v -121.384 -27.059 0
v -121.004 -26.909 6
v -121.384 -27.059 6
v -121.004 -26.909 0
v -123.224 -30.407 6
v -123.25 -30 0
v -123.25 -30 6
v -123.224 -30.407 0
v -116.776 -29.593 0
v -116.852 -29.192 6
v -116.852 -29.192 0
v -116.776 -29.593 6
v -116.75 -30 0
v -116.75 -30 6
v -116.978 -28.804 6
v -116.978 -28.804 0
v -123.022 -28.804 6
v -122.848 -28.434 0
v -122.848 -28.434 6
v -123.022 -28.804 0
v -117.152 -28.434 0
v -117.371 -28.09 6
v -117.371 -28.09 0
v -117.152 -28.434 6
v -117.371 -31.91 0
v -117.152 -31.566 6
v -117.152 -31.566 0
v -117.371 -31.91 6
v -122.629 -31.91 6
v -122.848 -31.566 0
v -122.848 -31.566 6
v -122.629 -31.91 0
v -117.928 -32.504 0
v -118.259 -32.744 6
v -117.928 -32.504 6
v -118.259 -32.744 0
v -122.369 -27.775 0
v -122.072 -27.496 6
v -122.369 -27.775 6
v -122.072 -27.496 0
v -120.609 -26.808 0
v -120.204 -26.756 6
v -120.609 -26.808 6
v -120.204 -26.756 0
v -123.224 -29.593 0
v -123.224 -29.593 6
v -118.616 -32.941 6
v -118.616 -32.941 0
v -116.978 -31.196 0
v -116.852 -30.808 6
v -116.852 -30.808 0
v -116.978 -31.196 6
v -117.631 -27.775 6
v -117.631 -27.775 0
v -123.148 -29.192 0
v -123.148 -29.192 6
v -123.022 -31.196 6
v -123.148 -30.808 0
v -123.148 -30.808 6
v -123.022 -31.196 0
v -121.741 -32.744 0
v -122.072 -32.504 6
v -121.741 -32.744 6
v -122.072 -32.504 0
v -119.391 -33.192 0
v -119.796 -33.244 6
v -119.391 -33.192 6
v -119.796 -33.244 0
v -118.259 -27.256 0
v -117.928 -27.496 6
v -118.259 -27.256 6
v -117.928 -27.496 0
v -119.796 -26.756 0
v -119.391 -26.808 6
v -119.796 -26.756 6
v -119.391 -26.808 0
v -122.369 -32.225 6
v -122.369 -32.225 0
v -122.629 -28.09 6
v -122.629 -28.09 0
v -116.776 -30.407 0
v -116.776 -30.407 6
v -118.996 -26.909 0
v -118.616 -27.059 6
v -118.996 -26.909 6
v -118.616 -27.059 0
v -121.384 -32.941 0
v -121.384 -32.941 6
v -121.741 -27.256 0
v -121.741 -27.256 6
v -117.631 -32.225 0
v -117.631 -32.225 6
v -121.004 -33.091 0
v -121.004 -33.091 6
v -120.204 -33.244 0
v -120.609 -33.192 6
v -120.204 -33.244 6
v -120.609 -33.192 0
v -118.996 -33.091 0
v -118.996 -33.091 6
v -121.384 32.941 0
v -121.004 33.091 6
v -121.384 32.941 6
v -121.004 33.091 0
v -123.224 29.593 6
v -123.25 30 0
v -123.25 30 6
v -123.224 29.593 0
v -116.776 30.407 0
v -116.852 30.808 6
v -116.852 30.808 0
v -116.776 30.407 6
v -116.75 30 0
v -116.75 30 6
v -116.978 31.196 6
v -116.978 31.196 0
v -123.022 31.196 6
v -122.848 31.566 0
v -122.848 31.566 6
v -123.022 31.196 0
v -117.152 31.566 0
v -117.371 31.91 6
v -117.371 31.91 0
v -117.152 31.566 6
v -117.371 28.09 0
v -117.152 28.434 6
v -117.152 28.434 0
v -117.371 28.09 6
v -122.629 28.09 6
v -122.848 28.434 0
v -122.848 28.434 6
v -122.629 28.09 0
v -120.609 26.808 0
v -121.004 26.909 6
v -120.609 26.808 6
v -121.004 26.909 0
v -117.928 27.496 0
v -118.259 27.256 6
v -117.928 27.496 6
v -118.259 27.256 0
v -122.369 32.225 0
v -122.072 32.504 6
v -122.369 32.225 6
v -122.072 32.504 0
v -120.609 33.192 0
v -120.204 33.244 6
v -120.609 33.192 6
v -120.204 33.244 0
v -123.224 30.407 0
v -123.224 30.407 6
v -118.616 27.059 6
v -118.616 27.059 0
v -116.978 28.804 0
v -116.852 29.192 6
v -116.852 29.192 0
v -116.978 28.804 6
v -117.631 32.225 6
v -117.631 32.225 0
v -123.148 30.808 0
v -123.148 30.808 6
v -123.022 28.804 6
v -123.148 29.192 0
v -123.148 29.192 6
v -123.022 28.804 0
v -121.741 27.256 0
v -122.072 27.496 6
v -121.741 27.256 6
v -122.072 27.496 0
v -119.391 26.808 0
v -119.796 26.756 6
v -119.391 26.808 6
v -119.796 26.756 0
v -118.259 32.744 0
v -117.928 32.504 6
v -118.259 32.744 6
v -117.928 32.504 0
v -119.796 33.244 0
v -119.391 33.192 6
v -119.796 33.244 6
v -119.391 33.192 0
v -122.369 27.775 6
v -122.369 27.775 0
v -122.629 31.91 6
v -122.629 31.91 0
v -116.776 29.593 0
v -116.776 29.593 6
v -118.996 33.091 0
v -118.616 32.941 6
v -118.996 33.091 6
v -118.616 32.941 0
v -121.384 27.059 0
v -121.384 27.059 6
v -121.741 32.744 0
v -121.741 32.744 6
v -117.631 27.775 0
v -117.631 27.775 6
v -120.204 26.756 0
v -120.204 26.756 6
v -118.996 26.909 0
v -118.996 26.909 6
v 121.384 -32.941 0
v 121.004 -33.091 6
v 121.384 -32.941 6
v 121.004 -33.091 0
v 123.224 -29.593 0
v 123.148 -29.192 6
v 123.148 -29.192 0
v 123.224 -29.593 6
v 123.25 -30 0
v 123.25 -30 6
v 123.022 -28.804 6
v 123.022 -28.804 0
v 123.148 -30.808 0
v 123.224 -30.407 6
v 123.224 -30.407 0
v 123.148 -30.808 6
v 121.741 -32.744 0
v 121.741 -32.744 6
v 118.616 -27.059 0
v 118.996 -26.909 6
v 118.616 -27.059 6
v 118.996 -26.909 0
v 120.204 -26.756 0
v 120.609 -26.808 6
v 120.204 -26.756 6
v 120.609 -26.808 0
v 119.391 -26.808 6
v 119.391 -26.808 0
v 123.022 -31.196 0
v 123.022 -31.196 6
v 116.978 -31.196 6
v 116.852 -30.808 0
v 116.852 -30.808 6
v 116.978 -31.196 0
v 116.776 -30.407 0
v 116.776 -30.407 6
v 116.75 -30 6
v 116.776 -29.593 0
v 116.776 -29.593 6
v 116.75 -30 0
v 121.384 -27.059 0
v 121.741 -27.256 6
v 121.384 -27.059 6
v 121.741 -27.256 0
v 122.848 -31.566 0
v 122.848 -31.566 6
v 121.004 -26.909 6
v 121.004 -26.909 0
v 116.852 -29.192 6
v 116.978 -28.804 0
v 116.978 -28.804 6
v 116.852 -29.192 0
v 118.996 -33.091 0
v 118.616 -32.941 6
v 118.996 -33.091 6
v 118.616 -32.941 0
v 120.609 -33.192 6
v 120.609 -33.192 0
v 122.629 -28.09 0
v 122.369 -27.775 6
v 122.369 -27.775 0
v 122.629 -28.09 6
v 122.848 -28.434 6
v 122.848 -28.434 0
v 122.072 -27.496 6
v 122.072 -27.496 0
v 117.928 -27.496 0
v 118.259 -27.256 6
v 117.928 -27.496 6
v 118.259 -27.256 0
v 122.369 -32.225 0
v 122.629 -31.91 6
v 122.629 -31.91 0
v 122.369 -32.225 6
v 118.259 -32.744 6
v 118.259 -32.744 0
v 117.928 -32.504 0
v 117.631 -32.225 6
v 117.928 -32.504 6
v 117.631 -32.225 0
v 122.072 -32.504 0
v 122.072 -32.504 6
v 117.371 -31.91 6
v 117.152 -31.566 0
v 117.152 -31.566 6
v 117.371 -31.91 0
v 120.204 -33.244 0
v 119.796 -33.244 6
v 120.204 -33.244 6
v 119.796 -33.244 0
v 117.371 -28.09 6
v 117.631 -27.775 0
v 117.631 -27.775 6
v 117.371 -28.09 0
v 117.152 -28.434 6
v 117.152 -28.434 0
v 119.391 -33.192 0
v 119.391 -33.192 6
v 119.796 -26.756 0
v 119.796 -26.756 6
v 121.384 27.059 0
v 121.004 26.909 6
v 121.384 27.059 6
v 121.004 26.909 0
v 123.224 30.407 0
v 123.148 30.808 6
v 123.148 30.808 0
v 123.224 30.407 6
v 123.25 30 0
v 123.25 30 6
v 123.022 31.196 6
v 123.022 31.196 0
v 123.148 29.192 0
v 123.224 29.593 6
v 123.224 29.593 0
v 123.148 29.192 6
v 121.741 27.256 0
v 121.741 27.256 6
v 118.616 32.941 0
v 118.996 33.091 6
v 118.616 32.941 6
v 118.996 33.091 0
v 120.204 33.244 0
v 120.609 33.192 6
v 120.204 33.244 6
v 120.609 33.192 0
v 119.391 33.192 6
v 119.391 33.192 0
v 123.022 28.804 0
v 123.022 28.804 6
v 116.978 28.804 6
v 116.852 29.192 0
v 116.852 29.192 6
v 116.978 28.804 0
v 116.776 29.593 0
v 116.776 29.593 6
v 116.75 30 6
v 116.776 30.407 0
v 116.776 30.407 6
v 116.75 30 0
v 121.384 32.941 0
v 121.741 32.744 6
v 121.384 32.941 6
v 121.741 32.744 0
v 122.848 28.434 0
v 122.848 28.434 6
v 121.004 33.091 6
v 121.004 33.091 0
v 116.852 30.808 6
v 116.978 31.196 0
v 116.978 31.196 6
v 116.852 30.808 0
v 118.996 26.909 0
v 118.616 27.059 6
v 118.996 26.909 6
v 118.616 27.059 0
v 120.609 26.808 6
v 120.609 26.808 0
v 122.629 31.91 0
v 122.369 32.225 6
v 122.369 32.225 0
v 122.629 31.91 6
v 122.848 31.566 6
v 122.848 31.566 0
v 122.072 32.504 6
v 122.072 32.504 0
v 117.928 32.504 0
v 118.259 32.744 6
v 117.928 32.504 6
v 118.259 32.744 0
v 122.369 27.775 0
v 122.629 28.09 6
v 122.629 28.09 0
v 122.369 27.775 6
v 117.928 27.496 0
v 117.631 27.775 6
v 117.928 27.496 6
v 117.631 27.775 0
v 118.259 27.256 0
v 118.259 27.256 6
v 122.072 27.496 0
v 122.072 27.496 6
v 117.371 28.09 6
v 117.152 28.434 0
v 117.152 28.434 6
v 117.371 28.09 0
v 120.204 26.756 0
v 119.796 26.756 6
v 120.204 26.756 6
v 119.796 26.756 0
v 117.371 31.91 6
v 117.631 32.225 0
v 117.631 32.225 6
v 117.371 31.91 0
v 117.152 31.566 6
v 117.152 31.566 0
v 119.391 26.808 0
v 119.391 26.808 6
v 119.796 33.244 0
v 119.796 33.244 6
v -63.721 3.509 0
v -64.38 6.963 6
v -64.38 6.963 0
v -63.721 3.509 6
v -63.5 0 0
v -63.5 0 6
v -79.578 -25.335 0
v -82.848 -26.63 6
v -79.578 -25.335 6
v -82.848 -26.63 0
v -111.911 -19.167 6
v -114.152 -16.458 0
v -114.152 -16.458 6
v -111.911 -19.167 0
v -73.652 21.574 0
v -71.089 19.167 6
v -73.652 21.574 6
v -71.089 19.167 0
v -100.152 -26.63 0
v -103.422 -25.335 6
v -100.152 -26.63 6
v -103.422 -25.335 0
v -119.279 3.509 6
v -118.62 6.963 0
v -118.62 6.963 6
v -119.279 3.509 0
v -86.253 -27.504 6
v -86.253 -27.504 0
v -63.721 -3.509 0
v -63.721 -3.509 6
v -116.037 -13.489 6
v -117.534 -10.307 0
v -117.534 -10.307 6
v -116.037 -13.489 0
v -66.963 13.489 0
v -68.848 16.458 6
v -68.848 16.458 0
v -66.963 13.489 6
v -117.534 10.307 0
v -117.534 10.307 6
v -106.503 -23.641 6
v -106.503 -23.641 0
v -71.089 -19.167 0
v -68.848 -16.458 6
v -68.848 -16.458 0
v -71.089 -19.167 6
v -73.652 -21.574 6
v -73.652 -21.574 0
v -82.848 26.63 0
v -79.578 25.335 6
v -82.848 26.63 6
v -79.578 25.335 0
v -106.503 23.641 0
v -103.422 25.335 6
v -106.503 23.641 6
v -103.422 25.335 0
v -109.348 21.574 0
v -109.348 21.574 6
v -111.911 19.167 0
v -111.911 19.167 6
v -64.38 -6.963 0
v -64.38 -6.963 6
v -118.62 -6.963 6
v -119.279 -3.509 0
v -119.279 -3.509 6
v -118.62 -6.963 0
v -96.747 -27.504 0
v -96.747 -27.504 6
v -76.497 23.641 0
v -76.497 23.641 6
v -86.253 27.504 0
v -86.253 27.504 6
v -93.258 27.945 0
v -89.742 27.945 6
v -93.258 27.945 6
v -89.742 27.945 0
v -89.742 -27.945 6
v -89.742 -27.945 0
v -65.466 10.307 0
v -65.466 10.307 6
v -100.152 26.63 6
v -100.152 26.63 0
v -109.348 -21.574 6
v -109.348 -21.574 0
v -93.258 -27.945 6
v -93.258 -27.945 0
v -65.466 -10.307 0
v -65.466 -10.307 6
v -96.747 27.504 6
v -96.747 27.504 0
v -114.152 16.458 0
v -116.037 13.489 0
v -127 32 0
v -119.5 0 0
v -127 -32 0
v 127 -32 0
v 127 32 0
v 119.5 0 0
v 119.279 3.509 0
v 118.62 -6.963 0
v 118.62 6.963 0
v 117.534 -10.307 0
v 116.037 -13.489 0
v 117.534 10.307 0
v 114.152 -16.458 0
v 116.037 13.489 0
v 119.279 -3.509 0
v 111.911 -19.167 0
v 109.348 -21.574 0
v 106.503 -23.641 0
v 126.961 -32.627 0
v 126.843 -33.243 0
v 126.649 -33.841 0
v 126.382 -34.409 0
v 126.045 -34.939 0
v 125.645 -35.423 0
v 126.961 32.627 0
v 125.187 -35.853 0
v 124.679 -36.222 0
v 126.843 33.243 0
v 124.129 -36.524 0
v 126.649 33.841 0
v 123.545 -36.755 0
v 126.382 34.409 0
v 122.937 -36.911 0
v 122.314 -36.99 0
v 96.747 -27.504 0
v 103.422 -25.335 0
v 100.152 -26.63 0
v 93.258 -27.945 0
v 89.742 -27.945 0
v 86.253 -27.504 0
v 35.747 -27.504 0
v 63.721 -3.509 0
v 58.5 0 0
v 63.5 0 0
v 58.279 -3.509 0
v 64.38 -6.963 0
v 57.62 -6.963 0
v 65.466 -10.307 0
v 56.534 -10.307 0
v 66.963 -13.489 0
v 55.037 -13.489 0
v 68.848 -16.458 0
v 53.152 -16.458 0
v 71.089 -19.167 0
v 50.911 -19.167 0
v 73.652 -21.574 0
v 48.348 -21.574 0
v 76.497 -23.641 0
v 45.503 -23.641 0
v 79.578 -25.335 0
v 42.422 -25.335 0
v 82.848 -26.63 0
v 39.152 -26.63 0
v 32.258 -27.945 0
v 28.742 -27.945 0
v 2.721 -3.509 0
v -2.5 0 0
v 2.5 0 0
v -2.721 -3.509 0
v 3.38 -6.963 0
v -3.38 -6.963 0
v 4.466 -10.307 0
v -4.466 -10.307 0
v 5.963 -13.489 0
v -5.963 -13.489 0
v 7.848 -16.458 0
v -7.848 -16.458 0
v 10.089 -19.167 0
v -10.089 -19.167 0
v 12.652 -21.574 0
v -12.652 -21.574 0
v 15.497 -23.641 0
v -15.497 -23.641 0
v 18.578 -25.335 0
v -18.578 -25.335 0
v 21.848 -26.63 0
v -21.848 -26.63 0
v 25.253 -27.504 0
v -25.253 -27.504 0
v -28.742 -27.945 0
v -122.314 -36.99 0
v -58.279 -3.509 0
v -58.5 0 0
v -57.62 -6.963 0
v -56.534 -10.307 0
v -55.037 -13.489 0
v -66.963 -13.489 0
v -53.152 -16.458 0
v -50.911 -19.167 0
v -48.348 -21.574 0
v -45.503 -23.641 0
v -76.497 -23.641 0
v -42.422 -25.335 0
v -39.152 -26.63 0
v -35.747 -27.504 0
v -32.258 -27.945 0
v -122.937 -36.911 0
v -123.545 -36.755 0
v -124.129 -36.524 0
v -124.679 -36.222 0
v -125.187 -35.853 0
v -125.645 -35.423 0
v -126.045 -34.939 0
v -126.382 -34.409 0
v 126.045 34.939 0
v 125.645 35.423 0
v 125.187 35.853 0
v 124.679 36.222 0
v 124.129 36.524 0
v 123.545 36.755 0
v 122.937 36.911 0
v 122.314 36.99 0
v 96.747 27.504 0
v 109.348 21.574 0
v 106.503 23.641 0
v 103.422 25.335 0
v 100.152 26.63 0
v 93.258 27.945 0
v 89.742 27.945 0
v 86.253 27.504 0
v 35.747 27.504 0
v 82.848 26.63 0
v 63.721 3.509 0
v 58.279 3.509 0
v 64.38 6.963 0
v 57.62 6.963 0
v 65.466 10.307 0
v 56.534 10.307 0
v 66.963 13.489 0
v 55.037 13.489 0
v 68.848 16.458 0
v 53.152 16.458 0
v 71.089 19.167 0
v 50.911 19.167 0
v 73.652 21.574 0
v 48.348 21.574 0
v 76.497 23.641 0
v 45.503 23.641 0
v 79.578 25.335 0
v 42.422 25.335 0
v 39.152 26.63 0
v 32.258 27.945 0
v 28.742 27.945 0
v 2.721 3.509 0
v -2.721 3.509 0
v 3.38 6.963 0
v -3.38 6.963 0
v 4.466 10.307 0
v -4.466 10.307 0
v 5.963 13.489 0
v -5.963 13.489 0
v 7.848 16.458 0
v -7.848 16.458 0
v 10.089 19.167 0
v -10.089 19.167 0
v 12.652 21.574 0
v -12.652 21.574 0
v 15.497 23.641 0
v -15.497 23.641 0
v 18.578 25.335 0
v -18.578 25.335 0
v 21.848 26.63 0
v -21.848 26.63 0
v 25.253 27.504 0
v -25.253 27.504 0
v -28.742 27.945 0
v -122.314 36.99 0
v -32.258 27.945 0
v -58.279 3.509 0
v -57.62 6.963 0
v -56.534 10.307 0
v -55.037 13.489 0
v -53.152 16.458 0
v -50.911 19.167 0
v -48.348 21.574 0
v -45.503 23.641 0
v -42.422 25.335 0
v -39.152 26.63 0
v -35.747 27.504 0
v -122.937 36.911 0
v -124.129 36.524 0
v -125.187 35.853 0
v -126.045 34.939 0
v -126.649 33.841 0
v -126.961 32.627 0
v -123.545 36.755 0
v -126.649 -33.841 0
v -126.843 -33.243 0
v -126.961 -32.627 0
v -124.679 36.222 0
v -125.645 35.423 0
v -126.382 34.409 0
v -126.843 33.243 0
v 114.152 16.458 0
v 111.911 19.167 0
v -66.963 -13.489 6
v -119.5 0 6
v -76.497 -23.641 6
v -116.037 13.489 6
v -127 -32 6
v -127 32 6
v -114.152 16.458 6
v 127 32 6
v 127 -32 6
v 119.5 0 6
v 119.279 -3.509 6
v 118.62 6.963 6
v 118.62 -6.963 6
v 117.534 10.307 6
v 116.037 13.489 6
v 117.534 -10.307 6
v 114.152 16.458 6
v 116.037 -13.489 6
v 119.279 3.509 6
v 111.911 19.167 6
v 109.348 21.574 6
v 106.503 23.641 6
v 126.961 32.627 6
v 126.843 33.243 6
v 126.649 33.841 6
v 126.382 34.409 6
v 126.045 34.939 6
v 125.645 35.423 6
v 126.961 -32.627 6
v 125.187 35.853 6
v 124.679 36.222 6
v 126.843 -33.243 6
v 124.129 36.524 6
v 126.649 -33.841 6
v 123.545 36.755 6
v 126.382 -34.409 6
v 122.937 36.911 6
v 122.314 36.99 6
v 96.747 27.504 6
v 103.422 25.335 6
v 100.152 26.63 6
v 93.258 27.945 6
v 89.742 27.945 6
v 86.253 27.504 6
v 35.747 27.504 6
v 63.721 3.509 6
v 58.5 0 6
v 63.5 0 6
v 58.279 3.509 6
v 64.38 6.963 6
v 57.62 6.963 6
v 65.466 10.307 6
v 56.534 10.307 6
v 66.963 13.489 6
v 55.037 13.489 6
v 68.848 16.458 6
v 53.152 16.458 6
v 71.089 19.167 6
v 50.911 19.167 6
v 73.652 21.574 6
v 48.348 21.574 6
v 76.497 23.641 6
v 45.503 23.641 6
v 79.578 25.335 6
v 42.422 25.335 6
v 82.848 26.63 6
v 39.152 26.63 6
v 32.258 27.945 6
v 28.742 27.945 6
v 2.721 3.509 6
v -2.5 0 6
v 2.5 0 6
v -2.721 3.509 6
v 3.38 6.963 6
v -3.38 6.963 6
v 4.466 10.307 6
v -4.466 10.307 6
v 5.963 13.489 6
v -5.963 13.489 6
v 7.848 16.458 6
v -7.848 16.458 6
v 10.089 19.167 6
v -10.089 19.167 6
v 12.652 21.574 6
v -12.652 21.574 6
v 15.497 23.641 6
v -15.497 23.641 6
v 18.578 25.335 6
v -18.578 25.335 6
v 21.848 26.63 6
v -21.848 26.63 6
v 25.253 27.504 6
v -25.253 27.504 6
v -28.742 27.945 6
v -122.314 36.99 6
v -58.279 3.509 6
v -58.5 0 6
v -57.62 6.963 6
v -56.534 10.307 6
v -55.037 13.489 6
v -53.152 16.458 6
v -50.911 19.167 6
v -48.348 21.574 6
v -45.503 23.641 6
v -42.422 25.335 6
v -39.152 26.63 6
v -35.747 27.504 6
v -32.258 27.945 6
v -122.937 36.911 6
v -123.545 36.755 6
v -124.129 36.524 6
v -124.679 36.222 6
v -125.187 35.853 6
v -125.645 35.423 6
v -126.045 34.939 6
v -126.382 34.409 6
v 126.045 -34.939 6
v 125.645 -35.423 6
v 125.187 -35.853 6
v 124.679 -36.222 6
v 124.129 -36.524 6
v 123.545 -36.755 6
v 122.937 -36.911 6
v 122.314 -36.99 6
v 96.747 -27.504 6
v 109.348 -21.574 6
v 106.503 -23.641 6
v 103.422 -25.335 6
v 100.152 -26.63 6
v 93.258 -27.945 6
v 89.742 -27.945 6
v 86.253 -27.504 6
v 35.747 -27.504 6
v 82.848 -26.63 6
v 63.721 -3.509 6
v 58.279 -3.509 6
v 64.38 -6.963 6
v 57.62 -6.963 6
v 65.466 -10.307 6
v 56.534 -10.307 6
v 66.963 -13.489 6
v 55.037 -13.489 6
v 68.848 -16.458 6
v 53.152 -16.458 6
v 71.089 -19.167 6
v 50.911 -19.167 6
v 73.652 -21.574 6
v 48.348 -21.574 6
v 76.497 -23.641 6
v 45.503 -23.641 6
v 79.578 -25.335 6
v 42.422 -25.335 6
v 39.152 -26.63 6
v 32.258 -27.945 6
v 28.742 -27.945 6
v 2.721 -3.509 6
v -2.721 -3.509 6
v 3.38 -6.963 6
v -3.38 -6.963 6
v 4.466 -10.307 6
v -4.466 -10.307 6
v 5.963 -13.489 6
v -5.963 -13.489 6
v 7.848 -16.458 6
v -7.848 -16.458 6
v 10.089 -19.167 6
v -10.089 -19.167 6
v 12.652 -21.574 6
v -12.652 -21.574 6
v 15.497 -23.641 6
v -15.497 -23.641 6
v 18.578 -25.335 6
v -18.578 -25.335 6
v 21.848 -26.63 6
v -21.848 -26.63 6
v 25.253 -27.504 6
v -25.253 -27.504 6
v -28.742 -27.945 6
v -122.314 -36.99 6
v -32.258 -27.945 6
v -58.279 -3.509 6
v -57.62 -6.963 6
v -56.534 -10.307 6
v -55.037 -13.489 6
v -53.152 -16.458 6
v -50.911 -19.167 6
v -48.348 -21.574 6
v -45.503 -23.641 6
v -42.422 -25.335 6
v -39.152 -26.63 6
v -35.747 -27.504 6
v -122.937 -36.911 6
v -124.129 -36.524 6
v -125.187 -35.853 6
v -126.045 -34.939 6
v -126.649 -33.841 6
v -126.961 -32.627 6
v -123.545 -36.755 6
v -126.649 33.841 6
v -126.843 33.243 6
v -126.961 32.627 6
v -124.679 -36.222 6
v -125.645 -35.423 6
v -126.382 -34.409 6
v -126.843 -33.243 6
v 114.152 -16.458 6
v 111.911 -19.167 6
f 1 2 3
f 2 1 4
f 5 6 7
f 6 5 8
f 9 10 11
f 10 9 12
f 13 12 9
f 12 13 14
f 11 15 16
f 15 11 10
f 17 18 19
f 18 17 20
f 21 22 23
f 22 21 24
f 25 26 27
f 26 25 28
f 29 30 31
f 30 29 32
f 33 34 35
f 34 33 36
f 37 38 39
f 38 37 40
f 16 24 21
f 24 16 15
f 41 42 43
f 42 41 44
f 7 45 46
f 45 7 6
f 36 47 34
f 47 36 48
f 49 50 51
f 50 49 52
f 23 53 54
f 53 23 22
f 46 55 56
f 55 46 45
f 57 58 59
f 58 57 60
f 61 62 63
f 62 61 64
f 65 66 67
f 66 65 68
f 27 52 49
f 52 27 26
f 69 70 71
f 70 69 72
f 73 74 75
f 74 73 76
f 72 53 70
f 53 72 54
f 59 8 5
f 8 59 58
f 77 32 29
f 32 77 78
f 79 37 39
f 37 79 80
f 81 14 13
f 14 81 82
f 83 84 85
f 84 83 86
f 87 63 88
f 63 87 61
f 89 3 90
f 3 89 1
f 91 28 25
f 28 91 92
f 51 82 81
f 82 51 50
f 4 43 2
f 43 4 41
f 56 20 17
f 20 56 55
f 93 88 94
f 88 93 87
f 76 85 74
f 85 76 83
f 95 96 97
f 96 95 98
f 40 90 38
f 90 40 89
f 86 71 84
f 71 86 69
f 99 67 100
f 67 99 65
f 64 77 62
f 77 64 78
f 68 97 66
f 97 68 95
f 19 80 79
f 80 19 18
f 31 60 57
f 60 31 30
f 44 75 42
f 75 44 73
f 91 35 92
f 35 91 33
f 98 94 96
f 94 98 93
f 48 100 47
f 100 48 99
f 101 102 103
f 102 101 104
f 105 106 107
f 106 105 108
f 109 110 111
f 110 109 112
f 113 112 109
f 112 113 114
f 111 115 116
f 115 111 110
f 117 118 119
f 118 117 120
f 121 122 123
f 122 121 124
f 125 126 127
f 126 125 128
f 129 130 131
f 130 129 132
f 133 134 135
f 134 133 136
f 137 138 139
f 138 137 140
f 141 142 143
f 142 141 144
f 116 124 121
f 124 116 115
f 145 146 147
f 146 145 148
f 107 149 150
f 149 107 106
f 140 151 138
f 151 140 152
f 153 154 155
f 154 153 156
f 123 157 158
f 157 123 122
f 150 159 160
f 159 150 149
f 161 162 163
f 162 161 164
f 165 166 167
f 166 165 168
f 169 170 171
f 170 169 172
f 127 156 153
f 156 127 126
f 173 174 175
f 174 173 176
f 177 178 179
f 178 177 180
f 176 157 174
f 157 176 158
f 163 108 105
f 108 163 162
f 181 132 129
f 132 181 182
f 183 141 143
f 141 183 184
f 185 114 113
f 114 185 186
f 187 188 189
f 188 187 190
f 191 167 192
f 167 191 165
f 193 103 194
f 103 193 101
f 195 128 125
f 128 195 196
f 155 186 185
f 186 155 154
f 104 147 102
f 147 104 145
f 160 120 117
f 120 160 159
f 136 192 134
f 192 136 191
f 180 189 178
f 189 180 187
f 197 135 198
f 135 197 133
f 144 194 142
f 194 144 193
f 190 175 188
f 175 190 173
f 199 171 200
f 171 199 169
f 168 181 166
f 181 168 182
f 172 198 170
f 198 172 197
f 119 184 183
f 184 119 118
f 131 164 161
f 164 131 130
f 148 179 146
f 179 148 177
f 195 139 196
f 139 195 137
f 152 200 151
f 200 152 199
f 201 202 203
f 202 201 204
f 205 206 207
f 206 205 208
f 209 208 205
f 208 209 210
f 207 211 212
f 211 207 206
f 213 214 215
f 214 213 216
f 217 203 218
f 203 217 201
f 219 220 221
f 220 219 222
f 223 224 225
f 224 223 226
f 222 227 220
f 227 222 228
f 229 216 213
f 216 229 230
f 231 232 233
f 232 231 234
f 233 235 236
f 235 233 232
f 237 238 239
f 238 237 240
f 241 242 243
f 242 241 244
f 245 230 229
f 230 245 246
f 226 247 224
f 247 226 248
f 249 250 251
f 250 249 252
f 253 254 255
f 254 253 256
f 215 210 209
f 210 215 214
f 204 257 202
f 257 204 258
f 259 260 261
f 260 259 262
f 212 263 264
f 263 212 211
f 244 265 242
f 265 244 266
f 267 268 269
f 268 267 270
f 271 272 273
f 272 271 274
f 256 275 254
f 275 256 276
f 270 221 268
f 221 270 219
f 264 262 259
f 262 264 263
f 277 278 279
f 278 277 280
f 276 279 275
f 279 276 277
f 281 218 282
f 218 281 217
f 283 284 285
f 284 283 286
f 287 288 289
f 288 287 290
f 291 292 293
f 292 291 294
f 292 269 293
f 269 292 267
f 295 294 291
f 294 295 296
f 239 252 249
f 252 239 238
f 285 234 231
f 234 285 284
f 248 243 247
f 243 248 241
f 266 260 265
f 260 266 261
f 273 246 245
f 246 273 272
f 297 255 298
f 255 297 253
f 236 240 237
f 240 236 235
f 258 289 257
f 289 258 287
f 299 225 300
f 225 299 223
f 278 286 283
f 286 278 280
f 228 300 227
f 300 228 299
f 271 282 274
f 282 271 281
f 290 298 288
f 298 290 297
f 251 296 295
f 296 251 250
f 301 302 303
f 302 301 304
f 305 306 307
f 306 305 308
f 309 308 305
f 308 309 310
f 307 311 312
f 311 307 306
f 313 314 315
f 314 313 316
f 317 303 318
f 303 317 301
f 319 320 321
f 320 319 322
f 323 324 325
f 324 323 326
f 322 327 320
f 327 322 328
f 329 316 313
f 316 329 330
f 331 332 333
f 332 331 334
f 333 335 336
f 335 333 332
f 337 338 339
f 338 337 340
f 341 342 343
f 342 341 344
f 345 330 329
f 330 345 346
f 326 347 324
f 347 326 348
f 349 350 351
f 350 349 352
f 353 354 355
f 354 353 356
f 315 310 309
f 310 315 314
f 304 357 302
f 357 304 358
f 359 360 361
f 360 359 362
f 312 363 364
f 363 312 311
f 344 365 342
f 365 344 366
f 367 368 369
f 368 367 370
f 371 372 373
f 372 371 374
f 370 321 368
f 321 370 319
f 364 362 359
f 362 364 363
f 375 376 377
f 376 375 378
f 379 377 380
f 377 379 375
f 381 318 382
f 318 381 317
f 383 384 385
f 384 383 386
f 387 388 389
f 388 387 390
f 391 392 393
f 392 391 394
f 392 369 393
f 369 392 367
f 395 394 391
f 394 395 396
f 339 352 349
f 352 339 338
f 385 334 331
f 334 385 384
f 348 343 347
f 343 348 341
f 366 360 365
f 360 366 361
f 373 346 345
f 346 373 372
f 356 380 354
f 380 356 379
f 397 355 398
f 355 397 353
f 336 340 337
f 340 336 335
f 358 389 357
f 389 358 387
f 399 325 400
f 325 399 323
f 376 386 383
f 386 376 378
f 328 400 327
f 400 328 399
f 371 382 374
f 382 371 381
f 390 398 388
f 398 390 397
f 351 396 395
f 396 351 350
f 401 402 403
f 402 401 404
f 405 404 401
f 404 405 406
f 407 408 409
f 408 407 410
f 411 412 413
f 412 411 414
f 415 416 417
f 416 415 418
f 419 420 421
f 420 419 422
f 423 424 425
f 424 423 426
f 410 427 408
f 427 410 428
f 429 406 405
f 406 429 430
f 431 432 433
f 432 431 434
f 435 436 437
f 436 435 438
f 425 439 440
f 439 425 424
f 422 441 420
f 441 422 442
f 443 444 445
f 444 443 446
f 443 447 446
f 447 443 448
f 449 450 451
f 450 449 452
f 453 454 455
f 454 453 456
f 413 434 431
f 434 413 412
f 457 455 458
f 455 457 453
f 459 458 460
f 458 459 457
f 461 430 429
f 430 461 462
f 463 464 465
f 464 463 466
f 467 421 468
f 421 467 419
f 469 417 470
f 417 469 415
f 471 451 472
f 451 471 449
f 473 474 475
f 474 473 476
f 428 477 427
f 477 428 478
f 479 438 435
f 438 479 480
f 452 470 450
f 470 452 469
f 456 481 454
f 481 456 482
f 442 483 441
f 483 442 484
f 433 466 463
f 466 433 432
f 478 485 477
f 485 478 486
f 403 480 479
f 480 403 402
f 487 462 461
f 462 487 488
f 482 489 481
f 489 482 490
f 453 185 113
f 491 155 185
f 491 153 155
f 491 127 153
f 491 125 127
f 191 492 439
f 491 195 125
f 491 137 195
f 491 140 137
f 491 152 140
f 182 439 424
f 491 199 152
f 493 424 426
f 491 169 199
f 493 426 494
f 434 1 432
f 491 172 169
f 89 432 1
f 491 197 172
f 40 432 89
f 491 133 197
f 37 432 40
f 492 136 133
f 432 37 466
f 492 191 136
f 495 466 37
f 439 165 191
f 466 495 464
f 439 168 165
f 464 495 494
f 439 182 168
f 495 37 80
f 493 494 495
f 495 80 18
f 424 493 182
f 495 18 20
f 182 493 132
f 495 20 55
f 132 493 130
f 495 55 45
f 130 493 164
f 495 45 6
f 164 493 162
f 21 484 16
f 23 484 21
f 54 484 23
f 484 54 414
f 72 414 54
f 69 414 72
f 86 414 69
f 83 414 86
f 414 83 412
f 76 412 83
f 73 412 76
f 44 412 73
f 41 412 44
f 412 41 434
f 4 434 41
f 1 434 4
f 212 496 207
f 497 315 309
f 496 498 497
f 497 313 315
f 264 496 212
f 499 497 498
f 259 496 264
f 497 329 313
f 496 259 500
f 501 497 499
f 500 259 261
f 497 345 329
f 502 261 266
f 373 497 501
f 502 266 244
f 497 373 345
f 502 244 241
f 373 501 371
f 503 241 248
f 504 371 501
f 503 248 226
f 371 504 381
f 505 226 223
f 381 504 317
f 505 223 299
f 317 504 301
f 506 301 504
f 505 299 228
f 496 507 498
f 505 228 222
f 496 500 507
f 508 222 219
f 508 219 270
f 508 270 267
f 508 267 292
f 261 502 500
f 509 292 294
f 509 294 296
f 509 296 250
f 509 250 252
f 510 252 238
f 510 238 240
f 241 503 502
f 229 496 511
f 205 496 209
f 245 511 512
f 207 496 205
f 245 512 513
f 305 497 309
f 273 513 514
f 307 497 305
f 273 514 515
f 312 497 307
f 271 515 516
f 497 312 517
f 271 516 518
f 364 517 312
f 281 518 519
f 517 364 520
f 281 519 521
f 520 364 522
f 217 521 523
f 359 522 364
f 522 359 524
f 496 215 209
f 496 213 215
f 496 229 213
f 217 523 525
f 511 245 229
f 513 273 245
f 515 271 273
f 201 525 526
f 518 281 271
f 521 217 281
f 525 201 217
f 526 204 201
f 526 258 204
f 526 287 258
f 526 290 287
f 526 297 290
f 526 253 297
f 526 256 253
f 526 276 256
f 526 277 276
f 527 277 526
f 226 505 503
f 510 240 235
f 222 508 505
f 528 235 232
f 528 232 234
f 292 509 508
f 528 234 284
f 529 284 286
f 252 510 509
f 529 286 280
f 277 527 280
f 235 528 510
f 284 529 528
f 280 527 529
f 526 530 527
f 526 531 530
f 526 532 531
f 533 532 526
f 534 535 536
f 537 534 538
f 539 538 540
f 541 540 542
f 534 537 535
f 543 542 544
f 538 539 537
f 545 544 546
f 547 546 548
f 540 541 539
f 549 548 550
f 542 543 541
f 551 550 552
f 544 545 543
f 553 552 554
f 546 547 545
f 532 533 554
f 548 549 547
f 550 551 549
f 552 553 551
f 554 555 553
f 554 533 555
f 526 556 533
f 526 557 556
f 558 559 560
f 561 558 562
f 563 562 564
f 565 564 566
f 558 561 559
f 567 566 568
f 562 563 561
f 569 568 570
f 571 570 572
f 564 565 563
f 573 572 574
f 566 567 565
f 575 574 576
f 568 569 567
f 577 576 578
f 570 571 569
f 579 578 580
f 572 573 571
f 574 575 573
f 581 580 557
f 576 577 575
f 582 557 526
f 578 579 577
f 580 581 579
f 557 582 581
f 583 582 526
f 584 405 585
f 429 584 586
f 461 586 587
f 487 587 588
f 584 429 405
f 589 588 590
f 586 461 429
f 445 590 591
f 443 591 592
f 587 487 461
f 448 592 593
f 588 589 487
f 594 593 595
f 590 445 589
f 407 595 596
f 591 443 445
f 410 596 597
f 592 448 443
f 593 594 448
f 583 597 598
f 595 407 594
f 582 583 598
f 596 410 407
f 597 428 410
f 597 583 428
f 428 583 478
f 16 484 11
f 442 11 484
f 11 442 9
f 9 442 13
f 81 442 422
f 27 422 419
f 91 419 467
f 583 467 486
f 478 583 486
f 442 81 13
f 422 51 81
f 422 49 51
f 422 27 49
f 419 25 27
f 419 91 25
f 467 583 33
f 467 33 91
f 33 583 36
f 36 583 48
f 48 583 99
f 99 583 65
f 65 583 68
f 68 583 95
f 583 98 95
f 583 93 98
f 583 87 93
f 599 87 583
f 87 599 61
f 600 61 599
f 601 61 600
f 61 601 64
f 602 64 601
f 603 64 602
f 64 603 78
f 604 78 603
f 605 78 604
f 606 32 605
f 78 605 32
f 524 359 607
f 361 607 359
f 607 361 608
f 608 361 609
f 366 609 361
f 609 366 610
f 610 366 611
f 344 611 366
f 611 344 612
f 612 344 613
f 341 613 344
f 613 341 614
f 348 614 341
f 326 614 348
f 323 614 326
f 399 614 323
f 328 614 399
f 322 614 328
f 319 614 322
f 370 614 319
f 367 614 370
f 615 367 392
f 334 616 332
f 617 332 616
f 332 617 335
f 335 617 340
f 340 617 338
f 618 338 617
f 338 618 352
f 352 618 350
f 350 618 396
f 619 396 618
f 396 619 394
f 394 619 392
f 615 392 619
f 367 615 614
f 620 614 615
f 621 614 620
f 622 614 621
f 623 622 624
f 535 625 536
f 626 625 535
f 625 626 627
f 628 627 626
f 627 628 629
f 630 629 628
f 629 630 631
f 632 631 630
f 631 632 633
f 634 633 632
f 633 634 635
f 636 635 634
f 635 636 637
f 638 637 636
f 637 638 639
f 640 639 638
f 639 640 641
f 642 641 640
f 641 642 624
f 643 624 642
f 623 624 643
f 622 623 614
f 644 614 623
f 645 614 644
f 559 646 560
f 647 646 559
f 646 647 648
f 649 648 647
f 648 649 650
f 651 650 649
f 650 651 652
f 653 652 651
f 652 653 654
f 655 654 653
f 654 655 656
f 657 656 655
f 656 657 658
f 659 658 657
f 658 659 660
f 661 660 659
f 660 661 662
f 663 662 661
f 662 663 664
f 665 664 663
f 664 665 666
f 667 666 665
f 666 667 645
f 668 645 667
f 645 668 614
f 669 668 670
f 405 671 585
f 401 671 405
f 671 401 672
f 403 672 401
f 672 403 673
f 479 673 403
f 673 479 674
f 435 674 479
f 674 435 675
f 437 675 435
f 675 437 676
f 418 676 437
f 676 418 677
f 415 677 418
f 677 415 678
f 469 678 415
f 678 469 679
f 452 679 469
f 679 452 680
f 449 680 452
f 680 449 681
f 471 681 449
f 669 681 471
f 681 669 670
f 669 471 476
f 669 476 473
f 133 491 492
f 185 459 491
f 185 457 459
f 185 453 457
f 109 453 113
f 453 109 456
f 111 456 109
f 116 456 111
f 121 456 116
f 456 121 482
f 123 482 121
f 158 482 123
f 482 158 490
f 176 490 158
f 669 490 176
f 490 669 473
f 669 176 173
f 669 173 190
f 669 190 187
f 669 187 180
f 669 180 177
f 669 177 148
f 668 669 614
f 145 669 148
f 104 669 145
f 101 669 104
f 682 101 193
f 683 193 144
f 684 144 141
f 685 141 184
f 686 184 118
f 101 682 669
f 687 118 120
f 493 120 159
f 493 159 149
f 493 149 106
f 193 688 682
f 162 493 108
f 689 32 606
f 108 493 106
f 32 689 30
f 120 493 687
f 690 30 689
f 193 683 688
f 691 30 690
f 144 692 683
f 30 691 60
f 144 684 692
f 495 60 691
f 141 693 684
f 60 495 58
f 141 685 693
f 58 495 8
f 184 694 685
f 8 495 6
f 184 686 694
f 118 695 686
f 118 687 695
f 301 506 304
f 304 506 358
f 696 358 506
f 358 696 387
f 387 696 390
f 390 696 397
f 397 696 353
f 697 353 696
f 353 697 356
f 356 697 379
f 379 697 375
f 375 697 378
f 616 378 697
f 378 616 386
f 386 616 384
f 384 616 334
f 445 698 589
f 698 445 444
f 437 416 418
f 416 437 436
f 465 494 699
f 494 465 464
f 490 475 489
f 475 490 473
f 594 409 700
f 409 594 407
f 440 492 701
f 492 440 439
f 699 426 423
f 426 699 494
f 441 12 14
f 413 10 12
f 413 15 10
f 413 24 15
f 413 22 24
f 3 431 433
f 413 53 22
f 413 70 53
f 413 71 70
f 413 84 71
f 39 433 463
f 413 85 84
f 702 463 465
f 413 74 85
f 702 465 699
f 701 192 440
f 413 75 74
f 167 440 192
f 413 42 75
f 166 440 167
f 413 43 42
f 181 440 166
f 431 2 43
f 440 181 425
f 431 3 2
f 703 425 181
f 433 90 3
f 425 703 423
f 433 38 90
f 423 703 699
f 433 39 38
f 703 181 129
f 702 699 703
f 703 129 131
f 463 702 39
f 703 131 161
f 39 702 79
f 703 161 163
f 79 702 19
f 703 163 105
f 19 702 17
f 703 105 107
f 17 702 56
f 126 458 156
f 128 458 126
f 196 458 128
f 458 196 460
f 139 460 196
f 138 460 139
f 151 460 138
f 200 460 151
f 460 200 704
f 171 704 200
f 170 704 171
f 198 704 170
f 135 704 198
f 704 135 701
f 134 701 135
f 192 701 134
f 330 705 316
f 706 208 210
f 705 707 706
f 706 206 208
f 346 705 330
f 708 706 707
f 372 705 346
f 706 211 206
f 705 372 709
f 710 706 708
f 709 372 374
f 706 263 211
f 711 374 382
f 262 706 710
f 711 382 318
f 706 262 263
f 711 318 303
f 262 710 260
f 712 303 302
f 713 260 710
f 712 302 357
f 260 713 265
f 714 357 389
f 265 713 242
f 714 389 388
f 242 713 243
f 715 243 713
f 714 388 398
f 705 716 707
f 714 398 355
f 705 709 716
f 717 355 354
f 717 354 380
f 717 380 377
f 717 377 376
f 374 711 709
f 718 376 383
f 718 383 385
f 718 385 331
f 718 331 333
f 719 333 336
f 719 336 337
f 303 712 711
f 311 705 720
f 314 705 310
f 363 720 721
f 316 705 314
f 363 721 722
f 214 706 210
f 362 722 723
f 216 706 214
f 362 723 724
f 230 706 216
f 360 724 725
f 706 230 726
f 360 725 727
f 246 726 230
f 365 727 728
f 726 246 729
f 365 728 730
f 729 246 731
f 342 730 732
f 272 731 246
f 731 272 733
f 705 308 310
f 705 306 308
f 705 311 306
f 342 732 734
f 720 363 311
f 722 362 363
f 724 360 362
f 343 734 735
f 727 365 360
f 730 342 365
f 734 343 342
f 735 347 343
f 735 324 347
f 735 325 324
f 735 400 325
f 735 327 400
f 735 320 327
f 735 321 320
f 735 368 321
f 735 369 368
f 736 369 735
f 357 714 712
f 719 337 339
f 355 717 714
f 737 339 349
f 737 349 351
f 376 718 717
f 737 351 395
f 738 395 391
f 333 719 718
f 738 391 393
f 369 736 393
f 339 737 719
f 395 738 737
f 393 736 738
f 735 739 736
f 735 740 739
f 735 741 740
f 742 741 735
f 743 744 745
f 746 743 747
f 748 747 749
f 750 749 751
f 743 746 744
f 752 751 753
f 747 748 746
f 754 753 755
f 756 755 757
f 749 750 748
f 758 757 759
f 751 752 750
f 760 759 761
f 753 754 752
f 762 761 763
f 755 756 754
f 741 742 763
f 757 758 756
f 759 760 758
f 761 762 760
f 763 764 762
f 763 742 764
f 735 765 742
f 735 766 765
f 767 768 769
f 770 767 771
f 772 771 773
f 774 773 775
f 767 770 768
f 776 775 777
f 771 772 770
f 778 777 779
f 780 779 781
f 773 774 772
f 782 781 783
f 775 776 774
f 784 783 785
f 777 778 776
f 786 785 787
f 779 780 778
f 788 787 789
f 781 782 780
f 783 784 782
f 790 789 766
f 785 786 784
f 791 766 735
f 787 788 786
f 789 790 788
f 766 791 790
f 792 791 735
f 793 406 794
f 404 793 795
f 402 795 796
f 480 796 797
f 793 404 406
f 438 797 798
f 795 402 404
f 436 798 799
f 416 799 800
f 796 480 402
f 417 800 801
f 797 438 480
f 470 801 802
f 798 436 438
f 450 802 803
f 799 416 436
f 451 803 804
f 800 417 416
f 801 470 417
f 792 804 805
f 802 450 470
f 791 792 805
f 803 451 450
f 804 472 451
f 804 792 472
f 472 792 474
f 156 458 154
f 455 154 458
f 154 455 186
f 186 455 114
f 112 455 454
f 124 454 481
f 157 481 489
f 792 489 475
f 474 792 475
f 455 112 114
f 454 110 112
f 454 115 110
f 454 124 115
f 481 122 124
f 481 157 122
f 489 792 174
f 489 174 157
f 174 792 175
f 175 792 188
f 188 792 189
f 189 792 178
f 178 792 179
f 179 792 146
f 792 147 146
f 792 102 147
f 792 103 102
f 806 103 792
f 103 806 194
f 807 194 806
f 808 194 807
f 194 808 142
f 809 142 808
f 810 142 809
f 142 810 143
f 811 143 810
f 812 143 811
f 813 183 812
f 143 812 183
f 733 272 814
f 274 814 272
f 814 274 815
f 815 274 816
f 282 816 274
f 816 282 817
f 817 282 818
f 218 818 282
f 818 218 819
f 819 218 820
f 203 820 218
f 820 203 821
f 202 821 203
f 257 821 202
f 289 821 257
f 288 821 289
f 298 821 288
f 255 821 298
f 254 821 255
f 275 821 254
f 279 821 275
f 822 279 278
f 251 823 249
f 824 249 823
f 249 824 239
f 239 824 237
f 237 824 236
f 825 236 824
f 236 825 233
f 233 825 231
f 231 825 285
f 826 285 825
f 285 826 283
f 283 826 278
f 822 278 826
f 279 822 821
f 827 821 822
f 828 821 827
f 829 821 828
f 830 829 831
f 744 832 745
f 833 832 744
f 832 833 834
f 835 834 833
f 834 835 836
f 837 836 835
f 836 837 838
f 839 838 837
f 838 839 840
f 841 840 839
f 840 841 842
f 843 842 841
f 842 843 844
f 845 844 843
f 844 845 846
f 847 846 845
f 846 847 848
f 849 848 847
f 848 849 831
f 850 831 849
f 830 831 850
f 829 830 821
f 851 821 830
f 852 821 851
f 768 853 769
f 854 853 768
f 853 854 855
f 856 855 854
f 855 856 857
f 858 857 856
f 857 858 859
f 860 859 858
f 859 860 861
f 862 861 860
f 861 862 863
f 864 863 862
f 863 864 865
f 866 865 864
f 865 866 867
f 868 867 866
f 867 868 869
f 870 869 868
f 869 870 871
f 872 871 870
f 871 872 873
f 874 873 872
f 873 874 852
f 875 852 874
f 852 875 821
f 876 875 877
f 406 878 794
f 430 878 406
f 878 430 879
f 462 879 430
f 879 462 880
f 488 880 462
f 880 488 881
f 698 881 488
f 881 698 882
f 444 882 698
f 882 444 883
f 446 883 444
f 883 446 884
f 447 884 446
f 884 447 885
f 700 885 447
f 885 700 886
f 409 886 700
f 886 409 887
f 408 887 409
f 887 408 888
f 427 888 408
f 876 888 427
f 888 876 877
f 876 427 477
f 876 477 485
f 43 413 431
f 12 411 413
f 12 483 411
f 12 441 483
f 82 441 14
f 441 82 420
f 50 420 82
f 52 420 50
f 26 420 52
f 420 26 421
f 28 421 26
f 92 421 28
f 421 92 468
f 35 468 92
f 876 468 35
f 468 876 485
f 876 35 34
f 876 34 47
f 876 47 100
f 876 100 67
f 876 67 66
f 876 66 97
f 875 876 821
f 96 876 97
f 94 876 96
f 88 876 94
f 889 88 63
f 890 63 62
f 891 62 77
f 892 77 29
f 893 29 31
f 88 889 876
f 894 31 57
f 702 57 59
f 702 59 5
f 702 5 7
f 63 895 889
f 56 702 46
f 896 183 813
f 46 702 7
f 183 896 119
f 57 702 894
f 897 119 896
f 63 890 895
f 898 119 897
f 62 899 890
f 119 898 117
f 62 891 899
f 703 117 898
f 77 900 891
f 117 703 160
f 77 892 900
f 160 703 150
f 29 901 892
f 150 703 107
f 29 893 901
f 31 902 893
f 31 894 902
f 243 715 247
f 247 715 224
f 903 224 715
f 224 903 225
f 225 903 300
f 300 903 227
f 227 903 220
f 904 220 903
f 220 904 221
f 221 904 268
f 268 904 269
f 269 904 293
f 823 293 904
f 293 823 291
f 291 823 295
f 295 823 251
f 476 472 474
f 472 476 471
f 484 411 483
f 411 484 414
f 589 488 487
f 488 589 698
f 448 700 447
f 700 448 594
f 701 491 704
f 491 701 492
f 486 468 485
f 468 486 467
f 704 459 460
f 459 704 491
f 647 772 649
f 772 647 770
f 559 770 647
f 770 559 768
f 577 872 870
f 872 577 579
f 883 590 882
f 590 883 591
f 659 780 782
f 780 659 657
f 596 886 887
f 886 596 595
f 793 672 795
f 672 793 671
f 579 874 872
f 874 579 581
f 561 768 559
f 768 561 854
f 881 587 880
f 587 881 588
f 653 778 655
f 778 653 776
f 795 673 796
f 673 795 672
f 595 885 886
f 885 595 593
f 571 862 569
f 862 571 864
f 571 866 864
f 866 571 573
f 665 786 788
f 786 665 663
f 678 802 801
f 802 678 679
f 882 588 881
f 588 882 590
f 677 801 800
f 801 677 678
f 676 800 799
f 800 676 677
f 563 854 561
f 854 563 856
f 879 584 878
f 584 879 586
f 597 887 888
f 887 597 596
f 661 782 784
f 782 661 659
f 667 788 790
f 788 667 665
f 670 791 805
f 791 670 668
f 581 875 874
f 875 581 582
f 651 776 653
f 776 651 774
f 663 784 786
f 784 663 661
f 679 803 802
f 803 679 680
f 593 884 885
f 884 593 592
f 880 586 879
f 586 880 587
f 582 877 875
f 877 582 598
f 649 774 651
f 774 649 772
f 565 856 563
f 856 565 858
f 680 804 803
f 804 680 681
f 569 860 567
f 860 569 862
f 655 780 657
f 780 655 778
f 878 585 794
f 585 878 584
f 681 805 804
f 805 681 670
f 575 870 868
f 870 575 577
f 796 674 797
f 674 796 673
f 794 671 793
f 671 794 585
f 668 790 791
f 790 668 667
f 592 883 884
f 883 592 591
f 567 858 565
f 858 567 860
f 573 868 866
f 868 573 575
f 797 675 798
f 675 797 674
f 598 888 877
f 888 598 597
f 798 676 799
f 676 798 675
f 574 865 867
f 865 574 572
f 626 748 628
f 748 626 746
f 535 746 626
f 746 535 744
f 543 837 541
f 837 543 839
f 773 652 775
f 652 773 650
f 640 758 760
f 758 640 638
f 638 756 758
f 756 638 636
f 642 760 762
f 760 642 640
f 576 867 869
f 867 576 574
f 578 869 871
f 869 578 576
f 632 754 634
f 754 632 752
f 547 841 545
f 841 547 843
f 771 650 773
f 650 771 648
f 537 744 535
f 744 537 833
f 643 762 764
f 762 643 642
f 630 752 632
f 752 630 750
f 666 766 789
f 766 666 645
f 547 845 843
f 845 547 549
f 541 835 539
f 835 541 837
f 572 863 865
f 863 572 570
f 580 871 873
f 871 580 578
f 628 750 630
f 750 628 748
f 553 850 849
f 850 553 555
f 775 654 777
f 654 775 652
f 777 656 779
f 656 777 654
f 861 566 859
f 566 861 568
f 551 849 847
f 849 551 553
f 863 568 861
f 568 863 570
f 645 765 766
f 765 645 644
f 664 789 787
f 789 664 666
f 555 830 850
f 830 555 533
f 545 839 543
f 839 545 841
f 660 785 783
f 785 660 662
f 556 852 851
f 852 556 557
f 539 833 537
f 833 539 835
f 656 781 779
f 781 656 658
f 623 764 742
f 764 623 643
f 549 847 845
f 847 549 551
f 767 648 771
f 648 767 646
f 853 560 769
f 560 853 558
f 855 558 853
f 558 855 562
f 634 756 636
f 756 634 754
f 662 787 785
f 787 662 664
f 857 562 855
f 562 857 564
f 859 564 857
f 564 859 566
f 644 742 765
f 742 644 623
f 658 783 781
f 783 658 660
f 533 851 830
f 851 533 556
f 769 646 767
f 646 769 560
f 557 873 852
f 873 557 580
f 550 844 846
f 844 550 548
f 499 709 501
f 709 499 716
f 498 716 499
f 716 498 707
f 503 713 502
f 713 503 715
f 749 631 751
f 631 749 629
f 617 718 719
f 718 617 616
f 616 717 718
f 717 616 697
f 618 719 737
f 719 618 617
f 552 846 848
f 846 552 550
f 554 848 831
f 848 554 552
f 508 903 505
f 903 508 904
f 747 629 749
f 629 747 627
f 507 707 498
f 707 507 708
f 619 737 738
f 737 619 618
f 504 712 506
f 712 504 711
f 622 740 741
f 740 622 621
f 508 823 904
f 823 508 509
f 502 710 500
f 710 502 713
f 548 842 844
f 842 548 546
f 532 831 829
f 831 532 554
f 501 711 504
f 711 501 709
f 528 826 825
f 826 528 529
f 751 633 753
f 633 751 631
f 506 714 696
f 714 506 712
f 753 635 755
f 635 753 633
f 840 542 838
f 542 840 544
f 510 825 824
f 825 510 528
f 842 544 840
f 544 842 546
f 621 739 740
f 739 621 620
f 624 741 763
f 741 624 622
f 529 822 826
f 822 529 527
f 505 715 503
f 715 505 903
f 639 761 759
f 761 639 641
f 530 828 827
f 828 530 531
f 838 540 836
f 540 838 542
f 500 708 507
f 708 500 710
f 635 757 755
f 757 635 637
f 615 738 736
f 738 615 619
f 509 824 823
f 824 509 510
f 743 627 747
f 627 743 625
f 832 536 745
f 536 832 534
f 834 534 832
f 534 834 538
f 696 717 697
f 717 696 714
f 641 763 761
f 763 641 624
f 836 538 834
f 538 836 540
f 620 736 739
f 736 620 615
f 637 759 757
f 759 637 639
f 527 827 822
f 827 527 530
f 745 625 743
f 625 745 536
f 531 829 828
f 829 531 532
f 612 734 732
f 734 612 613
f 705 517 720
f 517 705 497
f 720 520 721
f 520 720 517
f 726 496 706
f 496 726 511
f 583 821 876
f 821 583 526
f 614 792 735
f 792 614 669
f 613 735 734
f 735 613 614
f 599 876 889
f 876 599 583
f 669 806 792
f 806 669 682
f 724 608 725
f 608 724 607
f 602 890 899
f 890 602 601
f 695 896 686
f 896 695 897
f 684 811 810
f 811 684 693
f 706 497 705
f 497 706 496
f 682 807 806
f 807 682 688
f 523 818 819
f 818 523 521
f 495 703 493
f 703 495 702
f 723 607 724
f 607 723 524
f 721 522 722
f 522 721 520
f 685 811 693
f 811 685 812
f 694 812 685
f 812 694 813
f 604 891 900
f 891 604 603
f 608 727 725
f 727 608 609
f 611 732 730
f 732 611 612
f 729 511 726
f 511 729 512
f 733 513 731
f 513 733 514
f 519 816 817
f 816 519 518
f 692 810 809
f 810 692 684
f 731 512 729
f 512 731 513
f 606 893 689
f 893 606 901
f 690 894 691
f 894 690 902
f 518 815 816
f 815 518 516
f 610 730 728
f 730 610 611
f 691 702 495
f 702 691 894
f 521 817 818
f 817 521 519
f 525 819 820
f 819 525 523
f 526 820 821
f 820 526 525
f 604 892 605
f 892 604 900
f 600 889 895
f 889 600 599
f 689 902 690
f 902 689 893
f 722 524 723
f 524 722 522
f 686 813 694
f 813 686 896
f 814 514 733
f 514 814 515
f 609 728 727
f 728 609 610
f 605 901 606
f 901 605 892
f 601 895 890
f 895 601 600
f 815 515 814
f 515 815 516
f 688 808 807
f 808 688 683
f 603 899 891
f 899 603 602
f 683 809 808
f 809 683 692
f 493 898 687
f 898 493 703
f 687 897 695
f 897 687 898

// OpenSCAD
$fn = 50;


difference() {
	union() {
		hull() {
			translate(v = [-122.0000000000, 32.0000000000, 0]) {
				cylinder(h = 6, r = 5);
			}
			translate(v = [122.0000000000, 32.0000000000, 0]) {
				cylinder(h = 6, r = 5);
			}
			translate(v = [-122.0000000000, -32.0000000000, 0]) {
				cylinder(h = 6, r = 5);
			}
			translate(v = [122.0000000000, -32.0000000000, 0]) {
				cylinder(h = 6, r = 5);
			}
		}
	}
	union() {
		#translate(v = [-120.0000000000, -30.0000000000, -100.0000000000]) {
			cylinder(h = 200, r = 3.2500000000);
		}
		#translate(v = [-120.0000000000, 30.0000000000, -100.0000000000]) {
			cylinder(h = 200, r = 3.2500000000);
		}
		#translate(v = [120.0000000000, -30.0000000000, -100.0000000000]) {
			cylinder(h = 200, r = 3.2500000000);
		}
		#translate(v = [120.0000000000, 30.0000000000, -100.0000000000]) {
			cylinder(h = 200, r = 3.2500000000);
		}
		#translate(v = [-91.5000000000, 0, 0]) {
			cylinder(h = 6, r = 28.0000000000);
		}
		#translate(v = [-30.5000000000, 0, 0]) {
			cylinder(h = 6, r = 28.0000000000);
		}
		#translate(v = [30.5000000000, 0, 0]) {
			cylinder(h = 6, r = 28.0000000000);
		}
		#translate(v = [91.5000000000, 0, 0]) {
			cylinder(h = 6, r = 28.0000000000);
		}
	}
}
